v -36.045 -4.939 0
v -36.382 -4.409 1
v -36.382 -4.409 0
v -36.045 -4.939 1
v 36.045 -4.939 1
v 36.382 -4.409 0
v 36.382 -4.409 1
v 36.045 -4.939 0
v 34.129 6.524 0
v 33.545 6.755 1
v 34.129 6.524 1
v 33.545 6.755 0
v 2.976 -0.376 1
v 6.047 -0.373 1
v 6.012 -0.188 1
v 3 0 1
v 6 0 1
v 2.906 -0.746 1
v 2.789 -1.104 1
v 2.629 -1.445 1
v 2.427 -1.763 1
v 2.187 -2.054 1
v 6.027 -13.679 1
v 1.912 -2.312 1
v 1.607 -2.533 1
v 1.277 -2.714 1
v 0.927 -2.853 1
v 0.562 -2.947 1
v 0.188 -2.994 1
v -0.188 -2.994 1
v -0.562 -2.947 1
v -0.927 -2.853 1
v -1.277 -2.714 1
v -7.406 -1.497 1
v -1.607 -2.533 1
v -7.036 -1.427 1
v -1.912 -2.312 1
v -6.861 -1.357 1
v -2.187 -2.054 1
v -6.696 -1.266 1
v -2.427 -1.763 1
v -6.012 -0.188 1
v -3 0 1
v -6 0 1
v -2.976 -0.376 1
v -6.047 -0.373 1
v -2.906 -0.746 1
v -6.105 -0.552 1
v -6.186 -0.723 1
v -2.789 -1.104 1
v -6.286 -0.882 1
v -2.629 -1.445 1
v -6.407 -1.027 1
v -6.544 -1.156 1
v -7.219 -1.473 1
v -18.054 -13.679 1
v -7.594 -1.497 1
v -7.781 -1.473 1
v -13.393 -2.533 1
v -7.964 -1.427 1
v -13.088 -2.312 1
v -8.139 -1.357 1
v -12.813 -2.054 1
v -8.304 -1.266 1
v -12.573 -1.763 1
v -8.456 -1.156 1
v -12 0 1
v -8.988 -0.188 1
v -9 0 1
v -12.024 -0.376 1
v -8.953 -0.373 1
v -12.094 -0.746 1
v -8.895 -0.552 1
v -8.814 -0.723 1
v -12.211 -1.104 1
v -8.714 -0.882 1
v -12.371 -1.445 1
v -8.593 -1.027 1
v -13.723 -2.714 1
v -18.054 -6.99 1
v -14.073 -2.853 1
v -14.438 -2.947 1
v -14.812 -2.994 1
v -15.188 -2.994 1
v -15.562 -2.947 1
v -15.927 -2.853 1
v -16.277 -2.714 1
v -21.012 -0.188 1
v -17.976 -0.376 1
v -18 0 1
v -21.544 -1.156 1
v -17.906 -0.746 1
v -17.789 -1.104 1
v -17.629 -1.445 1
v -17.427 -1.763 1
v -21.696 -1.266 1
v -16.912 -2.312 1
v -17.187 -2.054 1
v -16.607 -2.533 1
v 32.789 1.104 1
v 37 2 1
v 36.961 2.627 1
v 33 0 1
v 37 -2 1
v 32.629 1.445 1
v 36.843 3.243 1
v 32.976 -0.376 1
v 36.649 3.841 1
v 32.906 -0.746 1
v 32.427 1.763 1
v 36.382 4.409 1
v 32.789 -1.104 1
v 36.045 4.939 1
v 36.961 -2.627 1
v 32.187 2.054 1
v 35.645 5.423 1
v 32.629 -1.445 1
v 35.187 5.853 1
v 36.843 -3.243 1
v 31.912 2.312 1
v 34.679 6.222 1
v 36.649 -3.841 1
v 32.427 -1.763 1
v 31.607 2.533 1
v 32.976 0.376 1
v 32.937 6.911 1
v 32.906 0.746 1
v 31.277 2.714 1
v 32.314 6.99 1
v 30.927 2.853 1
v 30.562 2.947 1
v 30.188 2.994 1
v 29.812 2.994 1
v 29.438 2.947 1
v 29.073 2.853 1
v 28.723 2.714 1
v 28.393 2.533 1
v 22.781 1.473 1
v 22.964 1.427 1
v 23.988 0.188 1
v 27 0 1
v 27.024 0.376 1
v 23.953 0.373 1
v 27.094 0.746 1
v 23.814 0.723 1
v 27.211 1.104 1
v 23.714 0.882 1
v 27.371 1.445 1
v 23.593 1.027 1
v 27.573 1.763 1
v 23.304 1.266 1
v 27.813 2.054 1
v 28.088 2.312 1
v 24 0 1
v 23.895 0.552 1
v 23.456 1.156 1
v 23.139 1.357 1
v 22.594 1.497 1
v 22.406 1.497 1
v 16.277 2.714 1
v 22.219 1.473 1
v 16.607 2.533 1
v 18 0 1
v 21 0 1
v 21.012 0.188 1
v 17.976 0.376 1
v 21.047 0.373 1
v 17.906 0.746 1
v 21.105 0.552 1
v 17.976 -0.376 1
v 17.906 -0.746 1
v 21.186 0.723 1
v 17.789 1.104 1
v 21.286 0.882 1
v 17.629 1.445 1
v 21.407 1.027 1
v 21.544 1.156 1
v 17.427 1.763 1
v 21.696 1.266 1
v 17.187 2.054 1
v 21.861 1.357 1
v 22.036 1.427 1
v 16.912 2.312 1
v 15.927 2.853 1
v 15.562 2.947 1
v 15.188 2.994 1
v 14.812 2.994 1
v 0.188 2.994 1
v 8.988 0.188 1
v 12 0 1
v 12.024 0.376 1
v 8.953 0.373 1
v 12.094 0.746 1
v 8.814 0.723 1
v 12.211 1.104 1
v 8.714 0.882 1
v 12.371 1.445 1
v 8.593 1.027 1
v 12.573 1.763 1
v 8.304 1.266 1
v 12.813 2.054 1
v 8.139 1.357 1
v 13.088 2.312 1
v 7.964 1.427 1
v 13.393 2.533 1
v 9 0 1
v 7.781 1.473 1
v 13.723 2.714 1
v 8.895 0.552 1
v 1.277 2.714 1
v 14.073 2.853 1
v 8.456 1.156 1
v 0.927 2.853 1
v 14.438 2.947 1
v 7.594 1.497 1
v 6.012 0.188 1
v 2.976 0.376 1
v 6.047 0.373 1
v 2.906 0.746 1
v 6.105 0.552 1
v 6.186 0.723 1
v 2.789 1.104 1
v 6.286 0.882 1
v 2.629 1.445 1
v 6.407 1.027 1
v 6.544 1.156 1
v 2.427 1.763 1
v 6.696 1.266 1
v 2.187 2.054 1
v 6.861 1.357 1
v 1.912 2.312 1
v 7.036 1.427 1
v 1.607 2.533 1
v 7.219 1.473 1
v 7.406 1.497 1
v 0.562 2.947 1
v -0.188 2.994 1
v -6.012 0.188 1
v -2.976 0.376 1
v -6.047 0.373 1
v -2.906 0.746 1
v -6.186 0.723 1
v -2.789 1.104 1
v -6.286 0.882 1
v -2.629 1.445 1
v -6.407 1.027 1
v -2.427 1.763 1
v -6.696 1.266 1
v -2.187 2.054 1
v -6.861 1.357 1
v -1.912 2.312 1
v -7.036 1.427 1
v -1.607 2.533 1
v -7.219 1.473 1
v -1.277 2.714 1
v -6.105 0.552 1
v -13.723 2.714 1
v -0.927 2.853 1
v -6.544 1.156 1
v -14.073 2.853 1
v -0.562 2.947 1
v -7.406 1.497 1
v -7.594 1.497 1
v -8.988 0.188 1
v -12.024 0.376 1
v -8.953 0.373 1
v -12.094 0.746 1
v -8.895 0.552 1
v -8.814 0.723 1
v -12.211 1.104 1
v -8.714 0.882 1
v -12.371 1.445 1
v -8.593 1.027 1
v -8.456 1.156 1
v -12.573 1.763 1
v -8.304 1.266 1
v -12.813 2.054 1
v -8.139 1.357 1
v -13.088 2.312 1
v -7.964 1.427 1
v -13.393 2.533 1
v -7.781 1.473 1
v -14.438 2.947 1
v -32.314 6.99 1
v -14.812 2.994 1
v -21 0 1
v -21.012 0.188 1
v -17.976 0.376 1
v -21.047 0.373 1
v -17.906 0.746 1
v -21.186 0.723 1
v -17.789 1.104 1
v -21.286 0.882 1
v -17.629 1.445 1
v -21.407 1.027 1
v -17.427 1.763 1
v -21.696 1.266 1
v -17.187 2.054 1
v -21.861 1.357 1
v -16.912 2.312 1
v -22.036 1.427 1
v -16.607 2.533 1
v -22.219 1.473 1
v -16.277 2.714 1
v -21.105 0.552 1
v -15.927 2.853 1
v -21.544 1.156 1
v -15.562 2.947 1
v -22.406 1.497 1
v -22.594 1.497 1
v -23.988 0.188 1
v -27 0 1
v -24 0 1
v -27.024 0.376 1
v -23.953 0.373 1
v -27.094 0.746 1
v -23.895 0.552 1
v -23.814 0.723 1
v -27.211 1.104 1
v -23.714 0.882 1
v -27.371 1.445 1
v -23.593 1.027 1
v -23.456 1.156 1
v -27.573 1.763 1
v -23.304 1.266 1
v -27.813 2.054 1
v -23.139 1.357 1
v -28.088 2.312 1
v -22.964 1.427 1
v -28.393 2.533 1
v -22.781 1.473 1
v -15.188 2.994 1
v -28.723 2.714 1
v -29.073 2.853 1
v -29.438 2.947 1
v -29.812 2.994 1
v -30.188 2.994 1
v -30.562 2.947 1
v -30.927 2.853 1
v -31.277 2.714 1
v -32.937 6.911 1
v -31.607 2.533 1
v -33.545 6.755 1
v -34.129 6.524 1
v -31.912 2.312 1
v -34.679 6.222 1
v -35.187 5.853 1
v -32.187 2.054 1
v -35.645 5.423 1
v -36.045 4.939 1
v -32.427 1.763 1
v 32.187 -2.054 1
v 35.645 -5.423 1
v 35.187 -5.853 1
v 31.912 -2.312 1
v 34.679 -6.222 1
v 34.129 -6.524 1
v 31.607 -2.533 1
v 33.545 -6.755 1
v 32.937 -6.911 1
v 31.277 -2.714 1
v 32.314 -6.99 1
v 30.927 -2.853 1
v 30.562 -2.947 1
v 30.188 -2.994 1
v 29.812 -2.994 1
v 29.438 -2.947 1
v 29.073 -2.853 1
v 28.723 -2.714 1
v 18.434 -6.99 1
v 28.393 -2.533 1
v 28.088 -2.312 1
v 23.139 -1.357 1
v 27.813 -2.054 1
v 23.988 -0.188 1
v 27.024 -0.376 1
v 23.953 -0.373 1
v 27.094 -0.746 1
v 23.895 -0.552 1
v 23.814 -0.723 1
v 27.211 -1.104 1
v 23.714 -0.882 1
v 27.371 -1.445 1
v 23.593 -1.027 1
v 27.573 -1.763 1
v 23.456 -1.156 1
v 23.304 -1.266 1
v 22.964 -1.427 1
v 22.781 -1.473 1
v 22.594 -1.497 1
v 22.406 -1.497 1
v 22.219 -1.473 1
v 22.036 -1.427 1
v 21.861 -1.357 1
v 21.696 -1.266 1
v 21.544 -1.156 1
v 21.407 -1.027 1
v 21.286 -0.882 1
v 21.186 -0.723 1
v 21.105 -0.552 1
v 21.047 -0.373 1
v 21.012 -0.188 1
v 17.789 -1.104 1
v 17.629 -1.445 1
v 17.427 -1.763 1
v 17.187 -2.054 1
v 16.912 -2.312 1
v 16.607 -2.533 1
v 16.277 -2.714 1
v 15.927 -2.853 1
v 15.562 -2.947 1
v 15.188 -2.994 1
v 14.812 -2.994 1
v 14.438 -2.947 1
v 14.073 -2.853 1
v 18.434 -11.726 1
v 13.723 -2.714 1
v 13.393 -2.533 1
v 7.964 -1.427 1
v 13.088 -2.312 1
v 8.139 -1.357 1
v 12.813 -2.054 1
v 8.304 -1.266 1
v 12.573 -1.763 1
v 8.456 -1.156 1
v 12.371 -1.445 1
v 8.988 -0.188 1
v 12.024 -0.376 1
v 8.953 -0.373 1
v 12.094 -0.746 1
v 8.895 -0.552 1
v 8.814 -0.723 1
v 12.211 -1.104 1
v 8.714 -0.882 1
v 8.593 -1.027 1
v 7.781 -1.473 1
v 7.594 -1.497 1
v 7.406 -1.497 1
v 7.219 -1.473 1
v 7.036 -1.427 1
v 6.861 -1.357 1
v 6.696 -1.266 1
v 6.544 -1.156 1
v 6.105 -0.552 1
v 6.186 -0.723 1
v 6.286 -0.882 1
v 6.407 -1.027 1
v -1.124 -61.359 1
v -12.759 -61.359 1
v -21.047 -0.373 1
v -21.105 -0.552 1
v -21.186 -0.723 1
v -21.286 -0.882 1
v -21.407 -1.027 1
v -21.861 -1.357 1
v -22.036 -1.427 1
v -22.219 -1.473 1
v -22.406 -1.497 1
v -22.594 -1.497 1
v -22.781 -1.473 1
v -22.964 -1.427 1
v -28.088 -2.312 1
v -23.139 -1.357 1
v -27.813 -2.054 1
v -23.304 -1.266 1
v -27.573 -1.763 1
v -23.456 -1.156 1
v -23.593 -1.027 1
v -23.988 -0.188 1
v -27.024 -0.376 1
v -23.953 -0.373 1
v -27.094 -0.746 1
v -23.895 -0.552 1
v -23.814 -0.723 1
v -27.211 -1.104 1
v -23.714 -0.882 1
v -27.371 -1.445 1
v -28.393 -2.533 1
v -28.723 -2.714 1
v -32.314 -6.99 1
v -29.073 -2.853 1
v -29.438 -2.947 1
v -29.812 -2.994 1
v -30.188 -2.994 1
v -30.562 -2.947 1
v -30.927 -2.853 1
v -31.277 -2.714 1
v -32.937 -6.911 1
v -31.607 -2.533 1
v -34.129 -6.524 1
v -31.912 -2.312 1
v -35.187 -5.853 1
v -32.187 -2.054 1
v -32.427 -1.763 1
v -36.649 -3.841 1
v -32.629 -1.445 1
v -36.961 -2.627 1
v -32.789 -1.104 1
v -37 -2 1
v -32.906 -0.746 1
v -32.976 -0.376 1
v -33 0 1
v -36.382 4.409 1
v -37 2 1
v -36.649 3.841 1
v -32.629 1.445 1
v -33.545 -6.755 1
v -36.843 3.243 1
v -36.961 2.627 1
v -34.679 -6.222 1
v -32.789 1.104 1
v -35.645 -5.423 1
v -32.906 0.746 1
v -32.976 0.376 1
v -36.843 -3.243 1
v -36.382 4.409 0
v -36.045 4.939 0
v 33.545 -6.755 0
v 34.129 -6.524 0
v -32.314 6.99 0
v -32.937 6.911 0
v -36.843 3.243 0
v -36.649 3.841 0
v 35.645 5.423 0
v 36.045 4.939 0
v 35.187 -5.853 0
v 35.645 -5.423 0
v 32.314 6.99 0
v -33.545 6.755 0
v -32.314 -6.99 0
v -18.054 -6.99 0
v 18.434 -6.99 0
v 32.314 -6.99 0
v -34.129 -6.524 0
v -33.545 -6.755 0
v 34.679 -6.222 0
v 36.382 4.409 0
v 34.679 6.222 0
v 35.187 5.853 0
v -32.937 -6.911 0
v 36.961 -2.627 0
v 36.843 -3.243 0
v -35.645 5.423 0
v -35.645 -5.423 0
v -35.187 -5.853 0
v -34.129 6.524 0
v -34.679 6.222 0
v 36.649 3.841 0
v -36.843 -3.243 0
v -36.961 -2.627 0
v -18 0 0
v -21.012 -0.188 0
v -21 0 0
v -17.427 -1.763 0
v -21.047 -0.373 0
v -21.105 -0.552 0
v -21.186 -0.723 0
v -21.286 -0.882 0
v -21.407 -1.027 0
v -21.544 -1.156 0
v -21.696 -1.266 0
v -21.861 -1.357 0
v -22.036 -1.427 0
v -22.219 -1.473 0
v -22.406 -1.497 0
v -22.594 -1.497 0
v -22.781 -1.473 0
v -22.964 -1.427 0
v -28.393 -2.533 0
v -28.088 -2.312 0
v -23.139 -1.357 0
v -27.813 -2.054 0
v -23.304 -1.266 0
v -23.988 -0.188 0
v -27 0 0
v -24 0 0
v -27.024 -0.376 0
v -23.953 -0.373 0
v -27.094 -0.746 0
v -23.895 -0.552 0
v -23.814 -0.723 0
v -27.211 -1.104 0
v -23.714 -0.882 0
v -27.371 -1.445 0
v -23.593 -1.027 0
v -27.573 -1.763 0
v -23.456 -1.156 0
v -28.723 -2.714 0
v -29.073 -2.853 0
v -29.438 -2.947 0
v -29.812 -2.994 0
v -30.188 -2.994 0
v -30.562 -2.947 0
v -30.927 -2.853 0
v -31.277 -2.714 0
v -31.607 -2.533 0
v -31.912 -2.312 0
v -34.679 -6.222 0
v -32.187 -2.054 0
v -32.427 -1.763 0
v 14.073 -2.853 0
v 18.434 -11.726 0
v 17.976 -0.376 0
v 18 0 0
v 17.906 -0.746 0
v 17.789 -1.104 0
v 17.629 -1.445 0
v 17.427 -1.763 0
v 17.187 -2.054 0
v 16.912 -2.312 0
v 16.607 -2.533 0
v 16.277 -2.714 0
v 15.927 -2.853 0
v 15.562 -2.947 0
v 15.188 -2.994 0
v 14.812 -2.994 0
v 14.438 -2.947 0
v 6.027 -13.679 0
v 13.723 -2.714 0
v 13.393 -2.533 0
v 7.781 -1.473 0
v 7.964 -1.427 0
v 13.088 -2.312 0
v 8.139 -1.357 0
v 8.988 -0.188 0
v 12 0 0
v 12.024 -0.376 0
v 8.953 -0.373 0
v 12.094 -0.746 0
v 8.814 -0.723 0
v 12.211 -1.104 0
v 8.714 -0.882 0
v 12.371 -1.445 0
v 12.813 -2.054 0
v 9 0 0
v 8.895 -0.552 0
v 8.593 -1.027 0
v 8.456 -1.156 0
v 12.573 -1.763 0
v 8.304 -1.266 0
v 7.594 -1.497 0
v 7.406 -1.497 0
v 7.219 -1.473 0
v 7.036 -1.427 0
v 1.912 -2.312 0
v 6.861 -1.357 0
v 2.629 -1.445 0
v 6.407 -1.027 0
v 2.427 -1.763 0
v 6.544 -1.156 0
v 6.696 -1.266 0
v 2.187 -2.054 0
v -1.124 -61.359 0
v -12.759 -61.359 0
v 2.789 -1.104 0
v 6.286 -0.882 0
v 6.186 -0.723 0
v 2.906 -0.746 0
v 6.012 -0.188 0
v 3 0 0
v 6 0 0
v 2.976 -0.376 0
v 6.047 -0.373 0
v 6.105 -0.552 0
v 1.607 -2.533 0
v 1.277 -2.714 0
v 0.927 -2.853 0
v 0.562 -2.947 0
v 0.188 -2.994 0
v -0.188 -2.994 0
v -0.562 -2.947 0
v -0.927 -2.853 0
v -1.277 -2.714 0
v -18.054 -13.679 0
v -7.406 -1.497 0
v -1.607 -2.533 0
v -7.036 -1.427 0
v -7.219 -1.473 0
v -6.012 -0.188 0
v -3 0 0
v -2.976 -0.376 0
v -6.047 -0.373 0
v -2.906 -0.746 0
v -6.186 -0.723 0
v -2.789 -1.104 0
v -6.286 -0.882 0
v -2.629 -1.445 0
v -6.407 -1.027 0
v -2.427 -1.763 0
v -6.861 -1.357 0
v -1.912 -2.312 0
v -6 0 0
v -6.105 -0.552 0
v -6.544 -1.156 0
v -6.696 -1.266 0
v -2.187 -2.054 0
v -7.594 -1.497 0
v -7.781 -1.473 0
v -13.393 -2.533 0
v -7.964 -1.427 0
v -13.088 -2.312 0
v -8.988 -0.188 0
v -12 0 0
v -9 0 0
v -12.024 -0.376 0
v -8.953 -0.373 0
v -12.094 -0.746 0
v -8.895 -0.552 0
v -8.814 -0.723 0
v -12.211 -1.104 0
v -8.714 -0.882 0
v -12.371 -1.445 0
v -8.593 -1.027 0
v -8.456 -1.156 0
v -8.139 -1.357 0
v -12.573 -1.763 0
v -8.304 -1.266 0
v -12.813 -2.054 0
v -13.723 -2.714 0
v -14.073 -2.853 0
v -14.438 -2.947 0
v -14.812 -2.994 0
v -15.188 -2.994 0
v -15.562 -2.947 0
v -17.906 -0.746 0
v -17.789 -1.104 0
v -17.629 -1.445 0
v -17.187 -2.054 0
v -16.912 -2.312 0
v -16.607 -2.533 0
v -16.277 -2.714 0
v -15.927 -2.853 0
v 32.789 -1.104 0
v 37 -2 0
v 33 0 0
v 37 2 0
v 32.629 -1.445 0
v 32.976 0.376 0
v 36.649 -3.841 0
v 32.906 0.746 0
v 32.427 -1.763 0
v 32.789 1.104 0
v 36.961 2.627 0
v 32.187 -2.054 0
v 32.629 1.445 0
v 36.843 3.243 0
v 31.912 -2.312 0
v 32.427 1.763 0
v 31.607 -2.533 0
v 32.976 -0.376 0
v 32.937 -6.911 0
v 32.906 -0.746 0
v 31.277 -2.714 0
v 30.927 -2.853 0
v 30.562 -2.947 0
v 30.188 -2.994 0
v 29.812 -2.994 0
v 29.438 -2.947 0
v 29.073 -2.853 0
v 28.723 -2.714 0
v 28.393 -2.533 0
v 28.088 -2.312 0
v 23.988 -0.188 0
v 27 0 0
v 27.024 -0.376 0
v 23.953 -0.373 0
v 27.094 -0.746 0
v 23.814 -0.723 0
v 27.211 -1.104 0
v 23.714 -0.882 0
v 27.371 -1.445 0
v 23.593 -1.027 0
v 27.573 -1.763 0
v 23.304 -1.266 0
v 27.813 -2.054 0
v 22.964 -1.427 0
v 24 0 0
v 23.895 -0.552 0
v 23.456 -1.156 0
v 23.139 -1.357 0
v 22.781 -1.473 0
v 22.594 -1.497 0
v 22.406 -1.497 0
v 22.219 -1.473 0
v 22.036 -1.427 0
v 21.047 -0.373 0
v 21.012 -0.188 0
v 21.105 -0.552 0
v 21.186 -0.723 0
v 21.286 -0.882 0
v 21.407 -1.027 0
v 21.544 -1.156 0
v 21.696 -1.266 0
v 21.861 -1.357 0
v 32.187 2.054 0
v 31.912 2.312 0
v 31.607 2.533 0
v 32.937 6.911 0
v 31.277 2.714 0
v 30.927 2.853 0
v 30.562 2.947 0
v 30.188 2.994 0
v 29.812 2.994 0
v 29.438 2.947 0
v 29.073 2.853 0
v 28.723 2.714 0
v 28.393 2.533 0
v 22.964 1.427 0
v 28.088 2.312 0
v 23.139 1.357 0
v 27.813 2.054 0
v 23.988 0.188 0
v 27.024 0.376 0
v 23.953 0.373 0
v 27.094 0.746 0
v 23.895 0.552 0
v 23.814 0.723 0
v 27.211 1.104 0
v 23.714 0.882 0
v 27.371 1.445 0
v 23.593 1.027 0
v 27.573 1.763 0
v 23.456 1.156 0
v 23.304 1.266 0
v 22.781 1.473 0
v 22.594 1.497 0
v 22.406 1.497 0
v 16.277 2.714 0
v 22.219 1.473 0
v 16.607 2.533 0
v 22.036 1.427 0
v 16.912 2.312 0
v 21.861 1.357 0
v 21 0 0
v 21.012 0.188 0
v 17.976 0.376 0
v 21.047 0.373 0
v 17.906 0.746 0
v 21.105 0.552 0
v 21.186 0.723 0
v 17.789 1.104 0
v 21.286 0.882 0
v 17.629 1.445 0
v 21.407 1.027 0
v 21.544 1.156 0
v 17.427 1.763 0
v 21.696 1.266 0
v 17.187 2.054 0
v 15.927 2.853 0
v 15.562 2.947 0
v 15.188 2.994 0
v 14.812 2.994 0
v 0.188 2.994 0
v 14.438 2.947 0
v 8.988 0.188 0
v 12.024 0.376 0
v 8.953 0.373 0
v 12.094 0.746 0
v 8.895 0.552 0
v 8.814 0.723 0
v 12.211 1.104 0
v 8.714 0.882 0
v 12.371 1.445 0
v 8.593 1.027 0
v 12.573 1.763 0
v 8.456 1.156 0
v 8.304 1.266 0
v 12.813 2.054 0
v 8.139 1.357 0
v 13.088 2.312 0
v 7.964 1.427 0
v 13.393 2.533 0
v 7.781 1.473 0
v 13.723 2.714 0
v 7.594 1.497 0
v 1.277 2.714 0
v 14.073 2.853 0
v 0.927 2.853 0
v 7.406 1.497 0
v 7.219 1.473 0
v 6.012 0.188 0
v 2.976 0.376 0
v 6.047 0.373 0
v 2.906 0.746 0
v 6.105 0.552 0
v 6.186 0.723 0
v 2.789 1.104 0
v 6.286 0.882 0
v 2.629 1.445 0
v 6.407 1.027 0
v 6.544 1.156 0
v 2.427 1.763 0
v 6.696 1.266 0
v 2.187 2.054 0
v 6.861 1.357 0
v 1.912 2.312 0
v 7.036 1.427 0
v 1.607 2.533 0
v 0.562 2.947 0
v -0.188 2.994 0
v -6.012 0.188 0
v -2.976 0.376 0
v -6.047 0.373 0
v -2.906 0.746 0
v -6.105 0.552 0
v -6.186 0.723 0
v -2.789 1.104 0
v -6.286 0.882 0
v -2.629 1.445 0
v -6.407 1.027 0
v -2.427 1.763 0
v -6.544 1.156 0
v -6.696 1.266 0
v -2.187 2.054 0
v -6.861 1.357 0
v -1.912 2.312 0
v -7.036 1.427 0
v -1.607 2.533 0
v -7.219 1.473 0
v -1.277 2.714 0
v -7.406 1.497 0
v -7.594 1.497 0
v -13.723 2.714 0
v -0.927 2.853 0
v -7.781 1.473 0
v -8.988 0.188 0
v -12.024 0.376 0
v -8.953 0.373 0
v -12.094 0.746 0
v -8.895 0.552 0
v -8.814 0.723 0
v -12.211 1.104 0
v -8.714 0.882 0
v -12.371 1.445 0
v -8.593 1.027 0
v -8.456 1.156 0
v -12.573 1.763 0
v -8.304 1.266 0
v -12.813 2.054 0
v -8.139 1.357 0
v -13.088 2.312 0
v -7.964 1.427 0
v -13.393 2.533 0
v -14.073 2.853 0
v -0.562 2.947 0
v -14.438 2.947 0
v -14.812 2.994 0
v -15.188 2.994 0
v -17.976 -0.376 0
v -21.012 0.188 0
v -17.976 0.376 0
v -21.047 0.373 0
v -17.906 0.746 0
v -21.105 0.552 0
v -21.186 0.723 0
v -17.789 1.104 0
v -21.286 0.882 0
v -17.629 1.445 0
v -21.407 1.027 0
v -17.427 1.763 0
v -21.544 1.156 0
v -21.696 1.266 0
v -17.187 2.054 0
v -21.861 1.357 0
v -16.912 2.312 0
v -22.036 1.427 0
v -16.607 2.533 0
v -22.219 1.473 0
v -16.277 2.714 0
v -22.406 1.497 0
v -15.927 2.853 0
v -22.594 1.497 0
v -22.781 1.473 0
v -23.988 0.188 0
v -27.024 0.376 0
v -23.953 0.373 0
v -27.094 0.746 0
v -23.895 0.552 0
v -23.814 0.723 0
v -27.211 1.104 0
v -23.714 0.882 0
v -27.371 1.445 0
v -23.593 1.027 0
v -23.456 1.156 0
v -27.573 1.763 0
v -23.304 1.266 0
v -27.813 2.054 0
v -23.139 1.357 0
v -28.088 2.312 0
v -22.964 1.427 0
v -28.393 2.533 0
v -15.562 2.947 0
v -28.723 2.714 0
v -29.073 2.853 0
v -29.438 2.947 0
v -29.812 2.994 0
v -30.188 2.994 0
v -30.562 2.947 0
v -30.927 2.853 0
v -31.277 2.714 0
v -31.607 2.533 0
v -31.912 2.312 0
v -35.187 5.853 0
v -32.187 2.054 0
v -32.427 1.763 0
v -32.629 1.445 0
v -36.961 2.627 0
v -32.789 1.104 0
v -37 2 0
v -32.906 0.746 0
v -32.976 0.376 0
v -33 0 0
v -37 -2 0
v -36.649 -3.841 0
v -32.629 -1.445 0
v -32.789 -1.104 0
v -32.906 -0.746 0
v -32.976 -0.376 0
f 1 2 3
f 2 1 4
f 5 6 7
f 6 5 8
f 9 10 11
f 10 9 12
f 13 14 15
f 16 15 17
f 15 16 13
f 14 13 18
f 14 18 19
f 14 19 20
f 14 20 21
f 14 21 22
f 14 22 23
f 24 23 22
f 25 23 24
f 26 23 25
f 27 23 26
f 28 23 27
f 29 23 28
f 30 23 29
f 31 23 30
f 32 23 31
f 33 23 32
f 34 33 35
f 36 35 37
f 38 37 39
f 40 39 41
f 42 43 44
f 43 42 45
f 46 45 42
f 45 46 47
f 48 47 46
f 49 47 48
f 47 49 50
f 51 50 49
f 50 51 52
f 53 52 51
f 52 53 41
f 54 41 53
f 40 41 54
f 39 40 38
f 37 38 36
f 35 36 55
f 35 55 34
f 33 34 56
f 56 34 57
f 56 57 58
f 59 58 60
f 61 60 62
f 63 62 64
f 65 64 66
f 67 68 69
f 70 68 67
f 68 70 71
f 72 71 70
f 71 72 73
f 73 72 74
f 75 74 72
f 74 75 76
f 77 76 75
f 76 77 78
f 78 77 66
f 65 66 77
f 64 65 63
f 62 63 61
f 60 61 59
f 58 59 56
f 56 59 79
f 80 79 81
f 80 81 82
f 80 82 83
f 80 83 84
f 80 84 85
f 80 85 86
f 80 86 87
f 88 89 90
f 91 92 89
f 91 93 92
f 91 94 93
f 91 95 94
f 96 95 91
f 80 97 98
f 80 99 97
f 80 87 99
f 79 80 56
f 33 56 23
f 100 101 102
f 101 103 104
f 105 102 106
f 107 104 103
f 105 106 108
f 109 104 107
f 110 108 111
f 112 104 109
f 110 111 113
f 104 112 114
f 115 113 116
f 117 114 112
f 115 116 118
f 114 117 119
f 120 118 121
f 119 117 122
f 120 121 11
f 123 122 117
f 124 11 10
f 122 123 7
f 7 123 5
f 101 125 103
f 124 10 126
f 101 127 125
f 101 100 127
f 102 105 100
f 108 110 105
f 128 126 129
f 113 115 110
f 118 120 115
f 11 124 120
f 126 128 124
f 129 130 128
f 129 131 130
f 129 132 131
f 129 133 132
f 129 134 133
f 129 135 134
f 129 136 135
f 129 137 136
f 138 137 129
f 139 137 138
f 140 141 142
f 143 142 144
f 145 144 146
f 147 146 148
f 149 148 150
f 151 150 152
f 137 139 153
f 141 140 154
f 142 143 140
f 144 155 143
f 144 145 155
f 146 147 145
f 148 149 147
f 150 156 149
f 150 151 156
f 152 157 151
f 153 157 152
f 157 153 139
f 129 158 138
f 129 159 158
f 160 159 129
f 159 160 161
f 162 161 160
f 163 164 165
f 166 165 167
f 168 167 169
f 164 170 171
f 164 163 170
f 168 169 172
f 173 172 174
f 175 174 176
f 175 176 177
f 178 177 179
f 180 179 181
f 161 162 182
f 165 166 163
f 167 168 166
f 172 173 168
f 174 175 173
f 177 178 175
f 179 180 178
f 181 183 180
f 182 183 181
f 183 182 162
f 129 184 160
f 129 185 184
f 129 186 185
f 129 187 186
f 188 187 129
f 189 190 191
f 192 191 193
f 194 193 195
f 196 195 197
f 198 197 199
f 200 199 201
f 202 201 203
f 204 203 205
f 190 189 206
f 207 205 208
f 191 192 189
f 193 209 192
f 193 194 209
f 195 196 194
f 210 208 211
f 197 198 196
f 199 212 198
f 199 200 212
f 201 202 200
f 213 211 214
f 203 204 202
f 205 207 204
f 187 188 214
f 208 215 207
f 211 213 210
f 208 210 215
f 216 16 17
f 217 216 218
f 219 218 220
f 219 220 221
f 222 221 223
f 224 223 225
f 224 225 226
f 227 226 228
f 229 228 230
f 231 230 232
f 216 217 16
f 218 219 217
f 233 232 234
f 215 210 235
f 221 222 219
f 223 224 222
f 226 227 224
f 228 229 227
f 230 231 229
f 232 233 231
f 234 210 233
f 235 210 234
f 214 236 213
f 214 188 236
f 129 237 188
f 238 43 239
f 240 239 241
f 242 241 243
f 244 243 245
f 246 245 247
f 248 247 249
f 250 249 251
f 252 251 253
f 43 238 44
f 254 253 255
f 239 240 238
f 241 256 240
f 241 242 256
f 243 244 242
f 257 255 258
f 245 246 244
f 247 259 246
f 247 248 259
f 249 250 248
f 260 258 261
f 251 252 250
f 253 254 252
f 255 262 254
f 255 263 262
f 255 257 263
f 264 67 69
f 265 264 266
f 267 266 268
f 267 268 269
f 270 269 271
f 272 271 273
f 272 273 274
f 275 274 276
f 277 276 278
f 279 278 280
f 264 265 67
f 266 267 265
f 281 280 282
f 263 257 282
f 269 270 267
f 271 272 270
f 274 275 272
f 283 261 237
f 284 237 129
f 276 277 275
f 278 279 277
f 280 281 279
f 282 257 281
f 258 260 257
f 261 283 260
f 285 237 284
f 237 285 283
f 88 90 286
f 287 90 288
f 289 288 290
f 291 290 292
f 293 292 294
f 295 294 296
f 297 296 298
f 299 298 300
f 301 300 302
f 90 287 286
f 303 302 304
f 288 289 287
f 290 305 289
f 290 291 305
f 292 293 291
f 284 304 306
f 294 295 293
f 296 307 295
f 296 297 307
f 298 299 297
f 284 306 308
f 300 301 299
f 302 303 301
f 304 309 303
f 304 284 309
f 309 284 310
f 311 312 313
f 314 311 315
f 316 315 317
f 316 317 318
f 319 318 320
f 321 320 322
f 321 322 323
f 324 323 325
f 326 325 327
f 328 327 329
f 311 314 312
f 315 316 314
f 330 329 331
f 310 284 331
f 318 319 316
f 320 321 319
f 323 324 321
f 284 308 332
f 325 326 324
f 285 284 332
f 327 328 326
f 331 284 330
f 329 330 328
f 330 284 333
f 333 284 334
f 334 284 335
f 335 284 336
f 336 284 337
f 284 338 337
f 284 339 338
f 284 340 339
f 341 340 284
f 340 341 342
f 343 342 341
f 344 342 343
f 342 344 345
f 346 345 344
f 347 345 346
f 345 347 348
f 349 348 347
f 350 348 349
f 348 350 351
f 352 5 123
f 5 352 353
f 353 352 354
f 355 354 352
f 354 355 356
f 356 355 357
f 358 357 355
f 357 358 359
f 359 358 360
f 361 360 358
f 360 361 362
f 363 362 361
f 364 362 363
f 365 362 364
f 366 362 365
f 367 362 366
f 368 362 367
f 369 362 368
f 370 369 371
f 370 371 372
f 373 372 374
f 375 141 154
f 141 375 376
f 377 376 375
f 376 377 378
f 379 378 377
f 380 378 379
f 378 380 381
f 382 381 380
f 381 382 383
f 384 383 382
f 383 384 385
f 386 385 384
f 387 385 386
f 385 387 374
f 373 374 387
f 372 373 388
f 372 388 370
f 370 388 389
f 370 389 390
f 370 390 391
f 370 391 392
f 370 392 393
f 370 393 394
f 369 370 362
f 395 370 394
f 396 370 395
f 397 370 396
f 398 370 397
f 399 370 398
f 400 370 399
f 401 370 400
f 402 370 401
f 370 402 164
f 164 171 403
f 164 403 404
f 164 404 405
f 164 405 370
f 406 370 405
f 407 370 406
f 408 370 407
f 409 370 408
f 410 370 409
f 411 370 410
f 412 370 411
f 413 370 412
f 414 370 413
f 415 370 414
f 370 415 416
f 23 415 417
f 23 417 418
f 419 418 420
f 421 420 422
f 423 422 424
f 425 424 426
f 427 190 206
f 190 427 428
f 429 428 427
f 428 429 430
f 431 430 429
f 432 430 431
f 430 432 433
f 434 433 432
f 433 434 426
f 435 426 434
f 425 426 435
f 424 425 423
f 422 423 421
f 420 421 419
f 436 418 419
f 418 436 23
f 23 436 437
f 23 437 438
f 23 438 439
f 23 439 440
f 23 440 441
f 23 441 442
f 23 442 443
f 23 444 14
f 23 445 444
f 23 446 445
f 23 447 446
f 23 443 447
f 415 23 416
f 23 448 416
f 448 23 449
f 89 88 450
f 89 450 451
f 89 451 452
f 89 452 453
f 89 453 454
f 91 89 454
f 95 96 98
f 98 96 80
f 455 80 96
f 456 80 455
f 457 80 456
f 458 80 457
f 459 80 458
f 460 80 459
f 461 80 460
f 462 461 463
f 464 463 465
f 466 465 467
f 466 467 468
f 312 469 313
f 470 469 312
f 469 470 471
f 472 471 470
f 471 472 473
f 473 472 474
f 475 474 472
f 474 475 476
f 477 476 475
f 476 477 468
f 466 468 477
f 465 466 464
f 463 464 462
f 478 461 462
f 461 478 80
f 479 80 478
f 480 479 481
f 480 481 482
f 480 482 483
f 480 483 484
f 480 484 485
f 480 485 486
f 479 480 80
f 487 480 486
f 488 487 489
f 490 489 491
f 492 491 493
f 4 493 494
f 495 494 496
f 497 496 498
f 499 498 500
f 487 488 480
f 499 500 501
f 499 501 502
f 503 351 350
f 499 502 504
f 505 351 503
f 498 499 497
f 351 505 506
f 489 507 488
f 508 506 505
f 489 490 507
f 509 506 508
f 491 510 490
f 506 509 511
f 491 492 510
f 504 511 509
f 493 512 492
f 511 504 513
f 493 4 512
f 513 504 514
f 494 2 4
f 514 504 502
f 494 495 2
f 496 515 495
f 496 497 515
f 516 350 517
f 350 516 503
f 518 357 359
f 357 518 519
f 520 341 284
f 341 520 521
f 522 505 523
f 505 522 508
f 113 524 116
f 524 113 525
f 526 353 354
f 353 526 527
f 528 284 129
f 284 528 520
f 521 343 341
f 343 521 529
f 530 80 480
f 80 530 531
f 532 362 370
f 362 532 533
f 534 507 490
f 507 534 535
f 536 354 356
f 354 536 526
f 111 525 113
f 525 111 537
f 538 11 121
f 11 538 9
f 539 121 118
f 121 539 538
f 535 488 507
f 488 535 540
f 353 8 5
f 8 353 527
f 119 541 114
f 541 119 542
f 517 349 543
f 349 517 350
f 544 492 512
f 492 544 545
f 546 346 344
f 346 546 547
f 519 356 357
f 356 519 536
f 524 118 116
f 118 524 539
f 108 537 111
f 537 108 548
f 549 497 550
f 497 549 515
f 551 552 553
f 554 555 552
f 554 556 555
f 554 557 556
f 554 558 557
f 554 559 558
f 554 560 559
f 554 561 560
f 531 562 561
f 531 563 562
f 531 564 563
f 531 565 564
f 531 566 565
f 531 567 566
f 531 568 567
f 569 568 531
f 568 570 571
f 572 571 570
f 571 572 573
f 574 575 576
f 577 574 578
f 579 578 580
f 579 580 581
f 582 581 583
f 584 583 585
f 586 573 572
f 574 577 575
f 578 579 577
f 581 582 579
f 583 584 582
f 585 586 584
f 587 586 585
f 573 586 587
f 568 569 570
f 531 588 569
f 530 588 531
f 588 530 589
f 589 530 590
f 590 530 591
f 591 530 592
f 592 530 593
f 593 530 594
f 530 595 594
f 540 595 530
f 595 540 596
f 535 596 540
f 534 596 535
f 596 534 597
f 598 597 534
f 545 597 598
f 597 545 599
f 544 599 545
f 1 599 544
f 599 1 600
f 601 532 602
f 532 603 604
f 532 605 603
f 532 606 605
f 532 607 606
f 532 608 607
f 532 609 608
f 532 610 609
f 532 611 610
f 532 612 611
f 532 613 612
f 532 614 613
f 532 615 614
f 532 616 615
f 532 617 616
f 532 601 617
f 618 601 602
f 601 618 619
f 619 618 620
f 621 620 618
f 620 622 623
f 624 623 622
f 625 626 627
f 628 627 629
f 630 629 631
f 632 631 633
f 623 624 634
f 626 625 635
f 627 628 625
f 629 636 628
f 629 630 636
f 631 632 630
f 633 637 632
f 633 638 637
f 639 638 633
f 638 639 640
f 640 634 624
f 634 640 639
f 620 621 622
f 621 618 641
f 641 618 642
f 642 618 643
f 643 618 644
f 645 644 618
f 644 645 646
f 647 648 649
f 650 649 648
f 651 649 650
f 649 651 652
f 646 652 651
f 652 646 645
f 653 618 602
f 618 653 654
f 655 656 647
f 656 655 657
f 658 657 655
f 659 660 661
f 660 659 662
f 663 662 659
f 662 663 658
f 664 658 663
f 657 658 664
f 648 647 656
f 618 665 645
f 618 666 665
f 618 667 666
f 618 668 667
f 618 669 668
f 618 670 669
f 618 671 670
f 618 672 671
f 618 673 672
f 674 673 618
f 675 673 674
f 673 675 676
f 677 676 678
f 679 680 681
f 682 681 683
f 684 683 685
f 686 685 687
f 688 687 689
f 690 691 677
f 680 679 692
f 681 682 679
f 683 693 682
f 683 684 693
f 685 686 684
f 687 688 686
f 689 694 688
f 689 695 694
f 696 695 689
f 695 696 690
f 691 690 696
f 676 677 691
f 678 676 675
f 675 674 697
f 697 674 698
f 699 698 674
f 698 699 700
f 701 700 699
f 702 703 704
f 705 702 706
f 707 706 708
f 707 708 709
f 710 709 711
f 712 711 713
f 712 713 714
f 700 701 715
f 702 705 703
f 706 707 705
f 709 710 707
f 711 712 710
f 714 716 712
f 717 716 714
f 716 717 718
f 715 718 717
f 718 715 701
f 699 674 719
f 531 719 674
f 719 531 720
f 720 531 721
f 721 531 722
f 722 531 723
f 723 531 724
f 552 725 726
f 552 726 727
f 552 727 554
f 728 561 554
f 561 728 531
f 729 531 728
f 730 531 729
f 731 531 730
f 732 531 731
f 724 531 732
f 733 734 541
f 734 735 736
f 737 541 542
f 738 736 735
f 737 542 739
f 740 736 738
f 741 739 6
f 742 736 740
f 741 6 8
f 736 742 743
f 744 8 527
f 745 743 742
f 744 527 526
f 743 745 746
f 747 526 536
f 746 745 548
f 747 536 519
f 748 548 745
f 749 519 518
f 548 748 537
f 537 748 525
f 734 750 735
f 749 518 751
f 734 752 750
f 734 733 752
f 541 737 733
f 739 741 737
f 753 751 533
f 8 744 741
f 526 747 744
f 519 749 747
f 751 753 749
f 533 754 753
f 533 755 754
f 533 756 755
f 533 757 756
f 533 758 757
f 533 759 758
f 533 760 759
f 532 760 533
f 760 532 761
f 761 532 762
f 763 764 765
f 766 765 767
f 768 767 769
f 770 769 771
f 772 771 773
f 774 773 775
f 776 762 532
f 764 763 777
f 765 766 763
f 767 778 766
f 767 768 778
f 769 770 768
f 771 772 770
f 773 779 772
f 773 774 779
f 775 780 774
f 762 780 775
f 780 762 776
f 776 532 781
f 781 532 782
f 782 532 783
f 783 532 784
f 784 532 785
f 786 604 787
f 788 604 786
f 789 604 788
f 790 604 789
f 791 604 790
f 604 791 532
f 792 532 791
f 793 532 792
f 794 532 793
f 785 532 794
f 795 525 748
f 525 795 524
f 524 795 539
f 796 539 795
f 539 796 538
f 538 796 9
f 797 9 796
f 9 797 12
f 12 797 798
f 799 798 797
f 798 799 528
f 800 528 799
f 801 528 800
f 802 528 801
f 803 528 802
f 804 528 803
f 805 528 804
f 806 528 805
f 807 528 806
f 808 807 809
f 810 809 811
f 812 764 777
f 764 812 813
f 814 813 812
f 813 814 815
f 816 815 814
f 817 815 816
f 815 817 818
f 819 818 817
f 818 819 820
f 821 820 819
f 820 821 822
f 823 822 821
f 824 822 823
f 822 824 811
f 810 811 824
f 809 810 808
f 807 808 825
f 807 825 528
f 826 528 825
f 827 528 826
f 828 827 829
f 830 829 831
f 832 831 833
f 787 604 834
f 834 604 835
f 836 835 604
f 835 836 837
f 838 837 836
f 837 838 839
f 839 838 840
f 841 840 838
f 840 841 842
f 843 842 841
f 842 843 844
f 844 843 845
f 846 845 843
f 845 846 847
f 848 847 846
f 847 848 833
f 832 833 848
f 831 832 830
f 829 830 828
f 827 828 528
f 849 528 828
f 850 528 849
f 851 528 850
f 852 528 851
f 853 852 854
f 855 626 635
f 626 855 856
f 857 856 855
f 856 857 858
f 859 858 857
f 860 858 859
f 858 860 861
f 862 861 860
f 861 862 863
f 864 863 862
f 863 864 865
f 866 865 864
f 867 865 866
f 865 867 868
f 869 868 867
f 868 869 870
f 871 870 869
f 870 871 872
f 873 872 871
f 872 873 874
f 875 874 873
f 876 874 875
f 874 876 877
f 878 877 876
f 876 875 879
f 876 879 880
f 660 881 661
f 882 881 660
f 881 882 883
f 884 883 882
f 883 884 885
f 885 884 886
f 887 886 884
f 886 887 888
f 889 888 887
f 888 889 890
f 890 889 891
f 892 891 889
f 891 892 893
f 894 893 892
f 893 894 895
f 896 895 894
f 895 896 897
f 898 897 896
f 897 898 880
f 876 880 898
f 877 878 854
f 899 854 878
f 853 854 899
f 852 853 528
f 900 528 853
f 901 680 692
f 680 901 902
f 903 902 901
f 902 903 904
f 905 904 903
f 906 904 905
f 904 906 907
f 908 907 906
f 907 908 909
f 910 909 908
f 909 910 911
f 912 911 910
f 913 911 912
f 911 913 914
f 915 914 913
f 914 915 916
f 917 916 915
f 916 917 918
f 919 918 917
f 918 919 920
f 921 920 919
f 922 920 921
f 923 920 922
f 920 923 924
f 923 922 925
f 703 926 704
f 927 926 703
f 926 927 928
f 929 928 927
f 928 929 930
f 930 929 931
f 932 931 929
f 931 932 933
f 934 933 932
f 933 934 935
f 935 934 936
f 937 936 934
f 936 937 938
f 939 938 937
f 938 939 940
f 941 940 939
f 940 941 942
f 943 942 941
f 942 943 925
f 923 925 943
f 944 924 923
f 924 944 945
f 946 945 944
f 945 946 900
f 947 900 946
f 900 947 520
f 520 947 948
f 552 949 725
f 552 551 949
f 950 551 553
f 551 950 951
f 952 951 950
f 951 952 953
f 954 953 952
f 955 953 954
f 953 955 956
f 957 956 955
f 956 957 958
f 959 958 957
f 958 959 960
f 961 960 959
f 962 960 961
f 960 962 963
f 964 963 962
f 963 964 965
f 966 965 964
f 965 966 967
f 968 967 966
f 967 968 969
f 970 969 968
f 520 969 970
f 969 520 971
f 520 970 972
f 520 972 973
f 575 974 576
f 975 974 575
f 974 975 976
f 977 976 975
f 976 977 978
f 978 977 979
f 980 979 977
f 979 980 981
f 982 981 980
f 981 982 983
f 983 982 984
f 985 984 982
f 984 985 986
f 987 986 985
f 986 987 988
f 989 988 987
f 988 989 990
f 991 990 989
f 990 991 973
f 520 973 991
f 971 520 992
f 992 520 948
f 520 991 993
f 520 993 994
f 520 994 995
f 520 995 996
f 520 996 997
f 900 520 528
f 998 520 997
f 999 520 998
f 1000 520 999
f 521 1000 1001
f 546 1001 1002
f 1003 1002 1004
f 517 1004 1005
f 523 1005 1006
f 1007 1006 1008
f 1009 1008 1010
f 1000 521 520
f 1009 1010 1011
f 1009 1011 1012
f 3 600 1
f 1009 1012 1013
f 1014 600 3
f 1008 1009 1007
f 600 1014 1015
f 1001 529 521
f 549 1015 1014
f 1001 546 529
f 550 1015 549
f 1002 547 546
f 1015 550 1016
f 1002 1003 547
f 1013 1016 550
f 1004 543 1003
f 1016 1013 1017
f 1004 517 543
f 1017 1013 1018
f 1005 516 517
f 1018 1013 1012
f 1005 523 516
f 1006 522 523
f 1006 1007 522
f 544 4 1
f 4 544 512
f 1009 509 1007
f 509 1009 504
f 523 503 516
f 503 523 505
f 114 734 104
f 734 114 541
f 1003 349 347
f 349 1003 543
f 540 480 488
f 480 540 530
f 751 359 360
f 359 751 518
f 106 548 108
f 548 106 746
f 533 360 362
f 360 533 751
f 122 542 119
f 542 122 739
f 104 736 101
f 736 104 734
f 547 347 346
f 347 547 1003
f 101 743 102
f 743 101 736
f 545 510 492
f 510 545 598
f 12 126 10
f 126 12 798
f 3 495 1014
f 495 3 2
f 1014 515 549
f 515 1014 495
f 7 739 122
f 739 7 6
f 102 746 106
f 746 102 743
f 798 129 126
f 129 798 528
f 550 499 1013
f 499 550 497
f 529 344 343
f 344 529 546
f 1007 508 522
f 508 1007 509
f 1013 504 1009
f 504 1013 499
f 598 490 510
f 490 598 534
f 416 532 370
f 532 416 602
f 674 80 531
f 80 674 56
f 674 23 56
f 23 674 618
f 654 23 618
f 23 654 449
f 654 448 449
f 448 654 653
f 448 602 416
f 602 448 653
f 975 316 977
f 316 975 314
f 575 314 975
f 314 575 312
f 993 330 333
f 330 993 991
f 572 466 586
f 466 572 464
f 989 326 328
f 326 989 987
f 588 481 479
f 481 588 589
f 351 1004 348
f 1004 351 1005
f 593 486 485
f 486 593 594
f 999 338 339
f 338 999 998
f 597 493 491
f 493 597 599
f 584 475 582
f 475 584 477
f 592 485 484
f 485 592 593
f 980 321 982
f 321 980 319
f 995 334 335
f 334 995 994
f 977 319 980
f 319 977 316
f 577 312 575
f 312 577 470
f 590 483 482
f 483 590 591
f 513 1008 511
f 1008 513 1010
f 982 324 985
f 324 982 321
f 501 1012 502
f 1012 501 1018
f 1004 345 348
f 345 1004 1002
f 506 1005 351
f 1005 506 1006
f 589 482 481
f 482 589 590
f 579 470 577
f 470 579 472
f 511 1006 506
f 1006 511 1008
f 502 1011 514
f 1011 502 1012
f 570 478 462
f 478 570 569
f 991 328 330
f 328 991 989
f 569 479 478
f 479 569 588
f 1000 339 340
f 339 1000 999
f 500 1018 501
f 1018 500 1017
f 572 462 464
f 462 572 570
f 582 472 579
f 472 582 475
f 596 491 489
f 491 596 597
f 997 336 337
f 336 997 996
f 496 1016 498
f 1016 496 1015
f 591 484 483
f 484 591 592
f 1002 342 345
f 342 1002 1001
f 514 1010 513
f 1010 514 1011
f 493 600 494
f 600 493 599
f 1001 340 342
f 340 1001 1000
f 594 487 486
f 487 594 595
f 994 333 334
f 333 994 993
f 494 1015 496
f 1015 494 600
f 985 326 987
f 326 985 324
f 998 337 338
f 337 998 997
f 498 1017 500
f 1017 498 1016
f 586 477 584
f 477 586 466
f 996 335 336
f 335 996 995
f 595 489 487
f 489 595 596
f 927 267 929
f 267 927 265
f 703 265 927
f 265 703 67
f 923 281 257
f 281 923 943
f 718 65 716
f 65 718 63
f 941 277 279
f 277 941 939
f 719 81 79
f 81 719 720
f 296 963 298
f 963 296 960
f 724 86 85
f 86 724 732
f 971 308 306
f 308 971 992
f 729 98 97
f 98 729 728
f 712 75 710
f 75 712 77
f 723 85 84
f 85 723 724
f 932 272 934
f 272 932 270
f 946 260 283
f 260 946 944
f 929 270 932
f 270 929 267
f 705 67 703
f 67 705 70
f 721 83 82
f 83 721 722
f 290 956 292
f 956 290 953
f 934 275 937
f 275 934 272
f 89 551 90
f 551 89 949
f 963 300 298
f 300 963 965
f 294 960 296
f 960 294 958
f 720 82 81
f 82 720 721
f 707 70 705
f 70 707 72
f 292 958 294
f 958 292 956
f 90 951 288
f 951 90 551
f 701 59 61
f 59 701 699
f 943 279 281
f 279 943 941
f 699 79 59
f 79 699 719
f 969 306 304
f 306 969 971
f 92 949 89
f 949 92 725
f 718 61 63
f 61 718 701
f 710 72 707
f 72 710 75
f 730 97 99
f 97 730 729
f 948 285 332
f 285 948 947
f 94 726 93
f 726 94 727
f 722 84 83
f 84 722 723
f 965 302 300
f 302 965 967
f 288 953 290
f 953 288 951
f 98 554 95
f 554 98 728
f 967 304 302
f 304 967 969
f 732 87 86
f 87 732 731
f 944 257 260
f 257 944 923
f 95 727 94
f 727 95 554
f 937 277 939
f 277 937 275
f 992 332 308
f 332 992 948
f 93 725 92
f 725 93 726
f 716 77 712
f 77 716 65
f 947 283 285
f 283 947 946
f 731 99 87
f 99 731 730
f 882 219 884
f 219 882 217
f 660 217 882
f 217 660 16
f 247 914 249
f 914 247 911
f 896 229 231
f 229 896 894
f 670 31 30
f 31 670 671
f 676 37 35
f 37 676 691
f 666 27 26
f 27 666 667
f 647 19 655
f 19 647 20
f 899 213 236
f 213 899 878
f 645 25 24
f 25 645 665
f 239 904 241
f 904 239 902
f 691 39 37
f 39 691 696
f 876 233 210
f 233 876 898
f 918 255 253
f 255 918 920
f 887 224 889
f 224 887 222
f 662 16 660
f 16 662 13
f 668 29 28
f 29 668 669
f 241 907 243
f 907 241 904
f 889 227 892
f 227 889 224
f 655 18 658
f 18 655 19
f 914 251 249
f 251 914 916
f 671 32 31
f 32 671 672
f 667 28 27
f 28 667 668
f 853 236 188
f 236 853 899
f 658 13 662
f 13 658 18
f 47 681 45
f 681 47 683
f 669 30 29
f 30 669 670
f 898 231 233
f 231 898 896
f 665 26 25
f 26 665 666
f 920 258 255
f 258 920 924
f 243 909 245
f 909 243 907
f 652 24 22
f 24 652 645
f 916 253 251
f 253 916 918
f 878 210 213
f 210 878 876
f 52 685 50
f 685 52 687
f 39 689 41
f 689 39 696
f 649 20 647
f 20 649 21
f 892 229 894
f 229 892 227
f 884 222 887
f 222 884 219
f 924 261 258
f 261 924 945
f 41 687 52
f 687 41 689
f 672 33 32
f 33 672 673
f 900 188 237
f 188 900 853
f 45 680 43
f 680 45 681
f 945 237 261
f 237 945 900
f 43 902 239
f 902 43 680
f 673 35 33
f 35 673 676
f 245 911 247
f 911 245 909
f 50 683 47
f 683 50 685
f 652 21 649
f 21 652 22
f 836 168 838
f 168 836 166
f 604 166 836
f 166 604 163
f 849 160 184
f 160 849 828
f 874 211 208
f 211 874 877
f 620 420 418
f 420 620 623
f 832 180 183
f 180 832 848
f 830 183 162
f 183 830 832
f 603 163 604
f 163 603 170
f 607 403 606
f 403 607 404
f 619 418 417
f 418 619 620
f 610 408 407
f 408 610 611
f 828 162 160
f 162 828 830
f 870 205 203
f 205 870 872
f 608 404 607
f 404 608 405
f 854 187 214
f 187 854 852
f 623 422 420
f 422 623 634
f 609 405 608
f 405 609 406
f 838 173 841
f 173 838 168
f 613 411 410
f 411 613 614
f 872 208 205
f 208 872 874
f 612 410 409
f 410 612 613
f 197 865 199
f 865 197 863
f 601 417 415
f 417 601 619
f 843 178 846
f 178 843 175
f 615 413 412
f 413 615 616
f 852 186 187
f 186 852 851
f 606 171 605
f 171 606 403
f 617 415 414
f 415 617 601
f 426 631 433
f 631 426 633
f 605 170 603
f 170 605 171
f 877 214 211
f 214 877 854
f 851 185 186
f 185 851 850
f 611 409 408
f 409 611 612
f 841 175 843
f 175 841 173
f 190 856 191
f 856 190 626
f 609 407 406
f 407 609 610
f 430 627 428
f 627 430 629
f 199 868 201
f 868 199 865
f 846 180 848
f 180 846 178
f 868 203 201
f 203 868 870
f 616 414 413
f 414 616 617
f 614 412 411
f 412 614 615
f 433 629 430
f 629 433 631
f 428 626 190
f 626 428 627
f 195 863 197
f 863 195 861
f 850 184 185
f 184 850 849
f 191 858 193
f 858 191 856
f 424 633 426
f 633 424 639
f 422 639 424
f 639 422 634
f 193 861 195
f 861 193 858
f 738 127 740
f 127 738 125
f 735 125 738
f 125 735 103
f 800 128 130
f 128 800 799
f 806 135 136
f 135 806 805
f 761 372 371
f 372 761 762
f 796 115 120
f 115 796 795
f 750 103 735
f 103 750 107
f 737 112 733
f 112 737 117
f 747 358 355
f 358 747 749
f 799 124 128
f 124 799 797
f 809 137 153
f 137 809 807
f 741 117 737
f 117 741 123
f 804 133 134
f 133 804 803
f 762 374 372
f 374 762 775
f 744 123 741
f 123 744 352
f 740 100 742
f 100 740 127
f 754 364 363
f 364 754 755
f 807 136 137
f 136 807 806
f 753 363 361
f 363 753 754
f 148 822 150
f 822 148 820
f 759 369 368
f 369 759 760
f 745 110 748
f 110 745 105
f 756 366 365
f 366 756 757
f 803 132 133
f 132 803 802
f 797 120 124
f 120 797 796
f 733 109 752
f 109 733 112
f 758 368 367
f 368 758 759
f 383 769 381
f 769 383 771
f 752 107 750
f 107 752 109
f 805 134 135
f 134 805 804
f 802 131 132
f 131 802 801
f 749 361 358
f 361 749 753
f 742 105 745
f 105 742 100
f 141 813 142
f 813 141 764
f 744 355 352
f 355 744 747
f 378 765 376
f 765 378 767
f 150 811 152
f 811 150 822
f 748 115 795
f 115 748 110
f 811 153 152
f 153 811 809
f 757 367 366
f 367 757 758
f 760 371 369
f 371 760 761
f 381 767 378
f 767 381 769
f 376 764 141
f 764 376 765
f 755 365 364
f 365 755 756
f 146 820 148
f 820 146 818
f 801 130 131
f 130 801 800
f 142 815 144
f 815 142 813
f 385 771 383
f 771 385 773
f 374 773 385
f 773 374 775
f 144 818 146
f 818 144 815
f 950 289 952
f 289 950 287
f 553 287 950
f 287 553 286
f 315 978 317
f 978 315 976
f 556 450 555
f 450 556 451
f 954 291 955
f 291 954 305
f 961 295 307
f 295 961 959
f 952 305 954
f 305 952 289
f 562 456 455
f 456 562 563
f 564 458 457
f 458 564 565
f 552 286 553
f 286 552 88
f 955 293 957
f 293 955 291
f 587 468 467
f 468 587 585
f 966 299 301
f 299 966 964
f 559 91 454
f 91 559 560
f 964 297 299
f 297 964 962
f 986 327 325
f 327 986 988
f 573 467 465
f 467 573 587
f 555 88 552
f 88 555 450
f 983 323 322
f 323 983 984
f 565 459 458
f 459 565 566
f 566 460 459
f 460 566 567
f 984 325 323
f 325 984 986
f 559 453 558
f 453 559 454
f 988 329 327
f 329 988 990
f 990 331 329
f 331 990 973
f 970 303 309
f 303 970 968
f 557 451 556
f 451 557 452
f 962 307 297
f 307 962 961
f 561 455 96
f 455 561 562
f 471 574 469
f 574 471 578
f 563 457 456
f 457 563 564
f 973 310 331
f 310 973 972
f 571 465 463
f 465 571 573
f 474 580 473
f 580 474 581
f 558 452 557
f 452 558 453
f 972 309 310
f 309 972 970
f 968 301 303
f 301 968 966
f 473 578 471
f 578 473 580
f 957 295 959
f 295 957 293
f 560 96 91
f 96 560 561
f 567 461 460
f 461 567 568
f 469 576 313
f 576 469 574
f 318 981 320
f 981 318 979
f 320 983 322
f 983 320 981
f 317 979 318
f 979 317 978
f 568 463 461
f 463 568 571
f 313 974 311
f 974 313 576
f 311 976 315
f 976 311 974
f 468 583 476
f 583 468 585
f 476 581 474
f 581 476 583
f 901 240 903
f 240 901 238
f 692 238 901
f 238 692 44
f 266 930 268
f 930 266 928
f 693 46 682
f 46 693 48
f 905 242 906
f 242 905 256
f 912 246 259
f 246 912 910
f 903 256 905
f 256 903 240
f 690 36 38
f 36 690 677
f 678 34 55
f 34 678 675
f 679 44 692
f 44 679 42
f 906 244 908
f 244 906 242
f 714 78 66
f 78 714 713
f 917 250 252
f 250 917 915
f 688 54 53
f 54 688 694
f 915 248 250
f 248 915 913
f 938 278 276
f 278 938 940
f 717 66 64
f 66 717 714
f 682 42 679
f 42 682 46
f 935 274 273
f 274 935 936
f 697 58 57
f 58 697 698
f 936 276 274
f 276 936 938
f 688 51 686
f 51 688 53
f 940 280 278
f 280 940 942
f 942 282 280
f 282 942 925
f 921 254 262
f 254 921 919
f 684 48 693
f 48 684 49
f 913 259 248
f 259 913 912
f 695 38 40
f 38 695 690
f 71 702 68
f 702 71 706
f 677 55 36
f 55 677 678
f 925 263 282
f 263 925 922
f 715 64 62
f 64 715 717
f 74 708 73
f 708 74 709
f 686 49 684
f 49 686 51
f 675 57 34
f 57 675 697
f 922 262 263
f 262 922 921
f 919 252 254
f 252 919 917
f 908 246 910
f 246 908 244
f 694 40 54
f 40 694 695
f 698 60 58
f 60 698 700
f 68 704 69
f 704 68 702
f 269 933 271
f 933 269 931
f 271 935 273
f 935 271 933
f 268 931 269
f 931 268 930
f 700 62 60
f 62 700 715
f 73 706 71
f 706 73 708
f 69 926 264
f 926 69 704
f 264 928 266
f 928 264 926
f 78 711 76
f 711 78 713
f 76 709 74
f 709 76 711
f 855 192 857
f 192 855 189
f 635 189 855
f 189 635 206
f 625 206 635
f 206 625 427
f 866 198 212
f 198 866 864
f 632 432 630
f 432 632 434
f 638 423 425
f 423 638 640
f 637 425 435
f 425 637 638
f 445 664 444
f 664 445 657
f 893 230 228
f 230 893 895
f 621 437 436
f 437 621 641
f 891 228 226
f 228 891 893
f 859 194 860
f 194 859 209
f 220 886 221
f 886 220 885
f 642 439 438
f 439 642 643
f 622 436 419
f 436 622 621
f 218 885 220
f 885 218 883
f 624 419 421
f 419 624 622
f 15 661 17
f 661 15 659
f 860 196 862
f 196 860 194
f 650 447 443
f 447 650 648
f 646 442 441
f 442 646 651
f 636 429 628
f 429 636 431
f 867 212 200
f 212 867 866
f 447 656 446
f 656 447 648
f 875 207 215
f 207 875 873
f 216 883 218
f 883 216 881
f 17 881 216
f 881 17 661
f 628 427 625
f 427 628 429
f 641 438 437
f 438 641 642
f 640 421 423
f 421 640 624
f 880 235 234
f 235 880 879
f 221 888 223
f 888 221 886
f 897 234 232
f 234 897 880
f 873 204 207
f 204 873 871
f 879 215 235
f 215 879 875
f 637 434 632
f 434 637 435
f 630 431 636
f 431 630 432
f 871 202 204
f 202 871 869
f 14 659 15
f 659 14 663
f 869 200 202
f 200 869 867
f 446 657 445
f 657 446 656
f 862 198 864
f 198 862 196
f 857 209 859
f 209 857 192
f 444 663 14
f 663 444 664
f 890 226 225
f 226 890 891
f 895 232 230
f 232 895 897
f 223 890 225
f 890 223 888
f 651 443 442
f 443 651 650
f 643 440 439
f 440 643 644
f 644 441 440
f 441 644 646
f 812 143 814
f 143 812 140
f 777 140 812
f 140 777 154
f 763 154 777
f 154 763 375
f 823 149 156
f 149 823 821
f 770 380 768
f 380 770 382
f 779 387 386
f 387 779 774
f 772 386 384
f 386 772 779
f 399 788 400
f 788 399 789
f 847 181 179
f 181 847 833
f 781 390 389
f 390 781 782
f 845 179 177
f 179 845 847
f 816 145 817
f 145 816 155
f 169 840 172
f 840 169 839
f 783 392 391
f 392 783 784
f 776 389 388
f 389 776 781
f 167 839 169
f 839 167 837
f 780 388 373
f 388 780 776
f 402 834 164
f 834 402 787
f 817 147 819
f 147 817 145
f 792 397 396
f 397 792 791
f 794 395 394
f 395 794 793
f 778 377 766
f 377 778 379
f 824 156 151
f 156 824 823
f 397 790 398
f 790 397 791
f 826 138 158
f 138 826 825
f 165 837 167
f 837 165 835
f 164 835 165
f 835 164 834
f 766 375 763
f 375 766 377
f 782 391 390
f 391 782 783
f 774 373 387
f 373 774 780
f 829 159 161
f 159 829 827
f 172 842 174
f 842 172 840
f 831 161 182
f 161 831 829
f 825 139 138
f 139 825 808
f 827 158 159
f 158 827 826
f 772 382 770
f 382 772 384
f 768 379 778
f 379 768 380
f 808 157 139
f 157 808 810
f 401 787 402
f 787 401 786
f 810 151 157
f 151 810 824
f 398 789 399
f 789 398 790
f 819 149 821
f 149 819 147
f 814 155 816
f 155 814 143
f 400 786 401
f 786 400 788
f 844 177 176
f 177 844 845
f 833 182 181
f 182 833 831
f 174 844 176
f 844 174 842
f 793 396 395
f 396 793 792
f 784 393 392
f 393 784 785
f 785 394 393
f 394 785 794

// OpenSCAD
$fn = 50;


difference() {
	union() {
		hull() {
			translate(v = [-32.0000000000, 2.0000000000, 0]) {
				cylinder(h = 1, r = 5);
			}
			translate(v = [32.0000000000, 2.0000000000, 0]) {
				cylinder(h = 1, r = 5);
			}
			translate(v = [-32.0000000000, -2.0000000000, 0]) {
				cylinder(h = 1, r = 5);
			}
			translate(v = [32.0000000000, -2.0000000000, 0]) {
				cylinder(h = 1, r = 5);
			}
		}
		translate(v = [0, -5, 0]) {
			linear_extrude(height = 1) {
				text(font = "DejaVu Sans Mono:style=Bold", halign = "center", size = 57.0000000000, text = "7", valign = "top");
			}
		}
	}
	union() {
		translate(v = [-30.0000000000, 0.0000000000, 0]) {
			translate(v = [0, 0, -100]) {
				cylinder(h = 200, r = 3.0000000000);
			}
		}
		translate(v = [-15.0000000000, 0.0000000000, 0]) {
			translate(v = [0, 0, -100]) {
				cylinder(h = 200, r = 3.0000000000);
			}
		}
		translate(v = [0, 0, -100]) {
			cylinder(h = 200, r = 3.0000000000);
		}
		translate(v = [15.0000000000, 0.0000000000, 0]) {
			translate(v = [0, 0, -100]) {
				cylinder(h = 200, r = 3.0000000000);
			}
		}
		translate(v = [30.0000000000, 0.0000000000, 0]) {
			translate(v = [0, 0, -100]) {
				cylinder(h = 200, r = 3.0000000000);
			}
		}
		translate(v = [-30.0000000000, 0.0000000000, 0]) {
			translate(v = [0, 0, -100]) {
				cylinder(h = 200, r = 1.5000000000);
			}
		}
		translate(v = [-22.5000000000, 0.0000000000, 0]) {
			translate(v = [0, 0, -100]) {
				cylinder(h = 200, r = 1.5000000000);
			}
		}
		translate(v = [-15.0000000000, 0.0000000000, 0]) {
			translate(v = [0, 0, -100]) {
				cylinder(h = 200, r = 1.5000000000);
			}
		}
		translate(v = [-7.5000000000, 0.0000000000, 0]) {
			translate(v = [0, 0, -100]) {
				cylinder(h = 200, r = 1.5000000000);
			}
		}
		translate(v = [0, 0, -100]) {
			cylinder(h = 200, r = 1.5000000000);
		}
		translate(v = [7.5000000000, 0.0000000000, 0]) {
			translate(v = [0, 0, -100]) {
				cylinder(h = 200, r = 1.5000000000);
			}
		}
		translate(v = [15.0000000000, 0.0000000000, 0]) {
			translate(v = [0, 0, -100]) {
				cylinder(h = 200, r = 1.5000000000);
			}
		}
		translate(v = [22.5000000000, 0.0000000000, 0]) {
			translate(v = [0, 0, -100]) {
				cylinder(h = 200, r = 1.5000000000);
			}
		}
		translate(v = [30.0000000000, 0.0000000000, 0]) {
			translate(v = [0, 0, -100]) {
				cylinder(h = 200, r = 1.5000000000);
			}
		}
	}
}
